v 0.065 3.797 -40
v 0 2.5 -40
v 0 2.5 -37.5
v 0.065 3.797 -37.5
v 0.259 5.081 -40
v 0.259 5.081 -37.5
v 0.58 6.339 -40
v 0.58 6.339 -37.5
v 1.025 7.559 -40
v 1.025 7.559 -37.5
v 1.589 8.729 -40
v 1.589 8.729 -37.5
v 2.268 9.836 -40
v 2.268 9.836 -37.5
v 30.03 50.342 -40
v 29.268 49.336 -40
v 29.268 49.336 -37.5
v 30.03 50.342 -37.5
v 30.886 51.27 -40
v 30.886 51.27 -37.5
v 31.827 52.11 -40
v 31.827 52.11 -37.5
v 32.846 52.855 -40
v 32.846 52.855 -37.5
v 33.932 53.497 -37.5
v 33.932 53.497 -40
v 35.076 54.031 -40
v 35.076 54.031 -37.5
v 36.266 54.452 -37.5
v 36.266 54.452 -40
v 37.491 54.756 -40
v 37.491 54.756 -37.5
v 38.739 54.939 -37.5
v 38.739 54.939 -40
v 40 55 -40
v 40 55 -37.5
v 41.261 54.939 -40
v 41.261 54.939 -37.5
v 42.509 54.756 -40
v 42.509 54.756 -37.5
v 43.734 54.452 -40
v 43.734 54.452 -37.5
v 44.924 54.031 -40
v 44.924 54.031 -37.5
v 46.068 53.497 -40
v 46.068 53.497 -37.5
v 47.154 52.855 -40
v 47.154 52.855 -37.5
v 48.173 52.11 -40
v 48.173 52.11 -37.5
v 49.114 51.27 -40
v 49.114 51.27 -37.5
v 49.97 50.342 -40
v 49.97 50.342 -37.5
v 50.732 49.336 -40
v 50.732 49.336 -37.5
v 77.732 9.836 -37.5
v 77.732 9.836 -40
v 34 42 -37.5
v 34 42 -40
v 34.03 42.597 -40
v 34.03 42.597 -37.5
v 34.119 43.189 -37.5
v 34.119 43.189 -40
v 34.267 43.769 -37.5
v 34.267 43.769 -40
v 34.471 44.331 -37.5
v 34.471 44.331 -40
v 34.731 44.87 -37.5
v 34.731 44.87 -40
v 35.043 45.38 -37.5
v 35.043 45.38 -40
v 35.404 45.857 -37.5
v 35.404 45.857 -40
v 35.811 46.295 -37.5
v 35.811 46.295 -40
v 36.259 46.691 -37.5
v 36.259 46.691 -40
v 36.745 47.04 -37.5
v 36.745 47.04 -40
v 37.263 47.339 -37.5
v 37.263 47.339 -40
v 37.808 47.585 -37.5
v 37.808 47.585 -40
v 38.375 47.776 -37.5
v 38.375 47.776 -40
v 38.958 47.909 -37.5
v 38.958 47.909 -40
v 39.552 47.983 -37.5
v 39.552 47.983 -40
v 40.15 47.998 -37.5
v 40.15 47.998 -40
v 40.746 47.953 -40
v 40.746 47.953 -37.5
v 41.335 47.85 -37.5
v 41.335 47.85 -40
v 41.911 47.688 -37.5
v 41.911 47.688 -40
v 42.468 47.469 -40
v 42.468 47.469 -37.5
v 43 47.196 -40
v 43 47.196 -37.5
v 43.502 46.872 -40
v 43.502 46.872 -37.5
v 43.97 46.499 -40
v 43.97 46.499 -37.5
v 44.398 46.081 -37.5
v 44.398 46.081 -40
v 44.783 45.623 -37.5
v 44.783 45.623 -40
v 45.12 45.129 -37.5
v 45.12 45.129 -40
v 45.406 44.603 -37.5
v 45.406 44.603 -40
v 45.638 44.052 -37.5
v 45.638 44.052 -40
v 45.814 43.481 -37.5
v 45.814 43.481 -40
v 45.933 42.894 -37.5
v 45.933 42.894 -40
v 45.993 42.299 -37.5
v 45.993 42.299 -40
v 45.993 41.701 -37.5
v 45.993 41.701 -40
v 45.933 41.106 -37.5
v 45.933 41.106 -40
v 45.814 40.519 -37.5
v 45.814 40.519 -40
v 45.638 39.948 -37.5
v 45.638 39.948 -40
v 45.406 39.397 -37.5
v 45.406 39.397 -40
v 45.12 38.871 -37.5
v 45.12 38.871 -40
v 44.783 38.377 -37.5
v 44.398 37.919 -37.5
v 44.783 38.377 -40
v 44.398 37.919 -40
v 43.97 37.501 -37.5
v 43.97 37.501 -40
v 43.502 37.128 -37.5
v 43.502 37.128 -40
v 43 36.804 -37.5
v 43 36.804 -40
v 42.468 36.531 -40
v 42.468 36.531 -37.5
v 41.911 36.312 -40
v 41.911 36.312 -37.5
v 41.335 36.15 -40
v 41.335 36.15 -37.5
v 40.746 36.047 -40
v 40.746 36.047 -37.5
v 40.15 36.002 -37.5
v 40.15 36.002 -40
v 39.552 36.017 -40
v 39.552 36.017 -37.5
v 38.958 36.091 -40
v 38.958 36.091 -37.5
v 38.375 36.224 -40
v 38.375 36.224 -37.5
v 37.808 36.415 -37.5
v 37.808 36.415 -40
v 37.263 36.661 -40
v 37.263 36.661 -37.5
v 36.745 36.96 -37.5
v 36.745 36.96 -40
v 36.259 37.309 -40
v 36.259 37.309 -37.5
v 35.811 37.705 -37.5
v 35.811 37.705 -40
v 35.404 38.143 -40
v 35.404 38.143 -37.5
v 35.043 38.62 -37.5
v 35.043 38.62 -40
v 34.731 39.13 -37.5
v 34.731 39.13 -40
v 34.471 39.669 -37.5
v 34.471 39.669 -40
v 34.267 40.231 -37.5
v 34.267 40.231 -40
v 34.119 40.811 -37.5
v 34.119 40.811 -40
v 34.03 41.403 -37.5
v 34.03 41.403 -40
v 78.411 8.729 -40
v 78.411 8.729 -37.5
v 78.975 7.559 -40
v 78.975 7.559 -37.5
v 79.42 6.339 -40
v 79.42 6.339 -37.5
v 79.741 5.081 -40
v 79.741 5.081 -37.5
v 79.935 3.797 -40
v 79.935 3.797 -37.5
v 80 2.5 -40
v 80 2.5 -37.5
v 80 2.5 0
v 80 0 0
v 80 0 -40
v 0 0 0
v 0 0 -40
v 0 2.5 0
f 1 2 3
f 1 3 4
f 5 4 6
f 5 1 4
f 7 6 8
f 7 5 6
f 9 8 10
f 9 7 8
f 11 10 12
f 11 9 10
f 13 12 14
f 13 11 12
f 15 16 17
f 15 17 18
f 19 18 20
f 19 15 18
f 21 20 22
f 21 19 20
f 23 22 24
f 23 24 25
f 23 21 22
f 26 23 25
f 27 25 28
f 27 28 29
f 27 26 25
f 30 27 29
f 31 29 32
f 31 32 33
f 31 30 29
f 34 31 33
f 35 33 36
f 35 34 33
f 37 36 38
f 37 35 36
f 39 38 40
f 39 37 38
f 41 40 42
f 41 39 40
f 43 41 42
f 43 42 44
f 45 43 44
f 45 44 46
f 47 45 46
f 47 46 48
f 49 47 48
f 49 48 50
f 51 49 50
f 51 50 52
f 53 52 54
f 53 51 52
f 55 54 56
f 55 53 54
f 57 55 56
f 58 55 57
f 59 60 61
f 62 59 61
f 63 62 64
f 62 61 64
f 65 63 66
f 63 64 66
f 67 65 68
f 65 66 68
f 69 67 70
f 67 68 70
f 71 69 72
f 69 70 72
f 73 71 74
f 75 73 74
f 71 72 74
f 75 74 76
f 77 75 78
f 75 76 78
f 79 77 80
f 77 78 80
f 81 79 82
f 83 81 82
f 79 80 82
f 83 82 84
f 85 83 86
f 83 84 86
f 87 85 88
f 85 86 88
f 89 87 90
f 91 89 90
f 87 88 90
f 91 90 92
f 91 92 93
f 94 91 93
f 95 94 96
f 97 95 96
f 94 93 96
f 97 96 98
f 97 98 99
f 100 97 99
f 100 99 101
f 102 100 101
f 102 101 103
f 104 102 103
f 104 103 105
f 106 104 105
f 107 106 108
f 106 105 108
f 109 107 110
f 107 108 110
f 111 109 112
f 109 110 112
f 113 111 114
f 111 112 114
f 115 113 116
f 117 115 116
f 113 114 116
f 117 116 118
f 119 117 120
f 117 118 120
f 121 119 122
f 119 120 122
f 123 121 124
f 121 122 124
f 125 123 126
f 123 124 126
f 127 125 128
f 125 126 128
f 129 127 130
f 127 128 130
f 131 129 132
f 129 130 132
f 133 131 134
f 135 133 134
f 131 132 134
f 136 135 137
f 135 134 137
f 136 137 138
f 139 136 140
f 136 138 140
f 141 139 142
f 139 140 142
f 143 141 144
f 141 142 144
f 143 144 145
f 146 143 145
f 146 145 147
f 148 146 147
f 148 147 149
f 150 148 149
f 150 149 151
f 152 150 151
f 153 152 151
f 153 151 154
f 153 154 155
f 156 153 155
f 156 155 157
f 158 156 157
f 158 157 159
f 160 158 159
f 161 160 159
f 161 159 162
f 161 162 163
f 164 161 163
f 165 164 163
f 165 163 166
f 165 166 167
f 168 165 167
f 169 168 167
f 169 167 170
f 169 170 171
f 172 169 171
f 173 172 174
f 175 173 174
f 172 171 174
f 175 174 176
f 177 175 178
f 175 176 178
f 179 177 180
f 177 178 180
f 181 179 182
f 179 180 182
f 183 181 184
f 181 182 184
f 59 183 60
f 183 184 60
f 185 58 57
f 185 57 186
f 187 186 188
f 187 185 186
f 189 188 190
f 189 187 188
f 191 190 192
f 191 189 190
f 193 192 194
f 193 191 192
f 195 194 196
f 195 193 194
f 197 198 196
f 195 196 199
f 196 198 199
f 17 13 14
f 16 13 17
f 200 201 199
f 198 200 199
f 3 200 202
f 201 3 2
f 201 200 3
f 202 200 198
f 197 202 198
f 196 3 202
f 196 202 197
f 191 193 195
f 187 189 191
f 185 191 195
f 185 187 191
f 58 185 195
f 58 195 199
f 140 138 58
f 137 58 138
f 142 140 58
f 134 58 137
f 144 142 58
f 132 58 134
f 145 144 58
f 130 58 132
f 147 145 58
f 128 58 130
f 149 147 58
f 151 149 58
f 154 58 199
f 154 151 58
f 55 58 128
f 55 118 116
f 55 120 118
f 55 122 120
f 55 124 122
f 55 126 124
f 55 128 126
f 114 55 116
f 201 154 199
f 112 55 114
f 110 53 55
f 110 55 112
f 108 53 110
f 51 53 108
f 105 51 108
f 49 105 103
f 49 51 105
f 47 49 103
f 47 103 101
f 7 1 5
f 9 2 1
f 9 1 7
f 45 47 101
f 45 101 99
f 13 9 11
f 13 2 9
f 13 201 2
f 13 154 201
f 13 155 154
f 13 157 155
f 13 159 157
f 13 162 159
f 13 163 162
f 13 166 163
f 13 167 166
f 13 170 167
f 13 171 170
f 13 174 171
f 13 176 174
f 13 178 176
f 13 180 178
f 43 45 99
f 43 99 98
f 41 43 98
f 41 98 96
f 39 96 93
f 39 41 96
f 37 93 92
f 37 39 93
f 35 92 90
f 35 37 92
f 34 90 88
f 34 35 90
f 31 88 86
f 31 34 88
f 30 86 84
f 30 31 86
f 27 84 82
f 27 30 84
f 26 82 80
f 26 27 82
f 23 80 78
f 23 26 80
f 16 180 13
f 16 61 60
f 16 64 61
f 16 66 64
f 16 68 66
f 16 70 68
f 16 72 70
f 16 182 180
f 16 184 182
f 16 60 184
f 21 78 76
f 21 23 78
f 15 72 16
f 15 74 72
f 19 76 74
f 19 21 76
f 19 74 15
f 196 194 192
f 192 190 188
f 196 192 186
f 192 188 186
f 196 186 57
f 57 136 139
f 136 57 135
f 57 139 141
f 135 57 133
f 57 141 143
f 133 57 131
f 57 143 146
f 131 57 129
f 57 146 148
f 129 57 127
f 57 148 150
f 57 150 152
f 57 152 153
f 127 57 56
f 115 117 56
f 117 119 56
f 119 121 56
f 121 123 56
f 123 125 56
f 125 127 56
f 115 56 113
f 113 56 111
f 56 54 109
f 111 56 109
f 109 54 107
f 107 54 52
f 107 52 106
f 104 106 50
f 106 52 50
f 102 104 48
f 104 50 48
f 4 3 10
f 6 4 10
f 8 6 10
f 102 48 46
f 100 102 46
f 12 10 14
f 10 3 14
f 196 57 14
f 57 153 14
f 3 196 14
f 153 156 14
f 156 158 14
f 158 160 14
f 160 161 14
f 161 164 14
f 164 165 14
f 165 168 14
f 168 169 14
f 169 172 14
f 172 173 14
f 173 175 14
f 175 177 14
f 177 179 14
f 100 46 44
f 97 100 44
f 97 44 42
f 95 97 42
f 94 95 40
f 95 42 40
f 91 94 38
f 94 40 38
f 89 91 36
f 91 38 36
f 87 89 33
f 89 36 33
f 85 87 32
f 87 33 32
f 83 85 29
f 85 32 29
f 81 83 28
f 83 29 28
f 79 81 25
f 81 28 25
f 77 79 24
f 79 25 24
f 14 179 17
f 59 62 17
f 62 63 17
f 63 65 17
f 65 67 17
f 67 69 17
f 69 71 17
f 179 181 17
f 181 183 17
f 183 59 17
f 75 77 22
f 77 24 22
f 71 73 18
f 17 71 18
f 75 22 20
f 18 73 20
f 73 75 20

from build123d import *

# Parameters (mm, degrees)
SKETCH1_W           = 80
SKETCH1_H           = 40
BOSS_EXTRUDE1_DEPTH = 2.5
SKETCH3_R           = 6
BOSS_EXTRUDE2_DEPTH = 2.5


with BuildPart() as part:
    # Sketch1 → Boss-Extrude1 (new body)
    with BuildSketch(Plane(origin=(0, 0, 0), x_dir=(1, 0, 0), z_dir=(0, 1, 0))):
        with Locations((40, 20)):
            Rectangle(SKETCH1_W, SKETCH1_H)
    extrude(amount=BOSS_EXTRUDE1_DEPTH)

    # Sketch3 → Boss-Extrude2 (add)
    with BuildSketch(Plane(origin=(0, 0, -40), x_dir=(-1, 0, 0), z_dir=(0, 0, -1))):
        with BuildLine():
            ThreePointArc((0, 2.5), (-0.57985041, 6.339255677), (-2.267674485, 9.836019972))
            Line((-2.267674485, 9.836019972), (-29.267674485, 49.336019972))
            ThreePointArc((-29.267674485, 49.336019972), (-40, 55), (-50.732325515, 49.336019972))
            Line((-50.732325515, 49.336019972), (-77.732325515, 9.836019972))
            ThreePointArc((-77.732325515, 9.836019972), (-79.42014959, 6.339255677), (-80, 2.5))
            Line((-80, 2.5), (0, 2.5))
        make_face()
        with Locations((-40, 42)):
            Circle(SKETCH3_R, mode=Mode.SUBTRACT)
    extrude(amount=-BOSS_EXTRUDE2_DEPTH)


solid = part.part
